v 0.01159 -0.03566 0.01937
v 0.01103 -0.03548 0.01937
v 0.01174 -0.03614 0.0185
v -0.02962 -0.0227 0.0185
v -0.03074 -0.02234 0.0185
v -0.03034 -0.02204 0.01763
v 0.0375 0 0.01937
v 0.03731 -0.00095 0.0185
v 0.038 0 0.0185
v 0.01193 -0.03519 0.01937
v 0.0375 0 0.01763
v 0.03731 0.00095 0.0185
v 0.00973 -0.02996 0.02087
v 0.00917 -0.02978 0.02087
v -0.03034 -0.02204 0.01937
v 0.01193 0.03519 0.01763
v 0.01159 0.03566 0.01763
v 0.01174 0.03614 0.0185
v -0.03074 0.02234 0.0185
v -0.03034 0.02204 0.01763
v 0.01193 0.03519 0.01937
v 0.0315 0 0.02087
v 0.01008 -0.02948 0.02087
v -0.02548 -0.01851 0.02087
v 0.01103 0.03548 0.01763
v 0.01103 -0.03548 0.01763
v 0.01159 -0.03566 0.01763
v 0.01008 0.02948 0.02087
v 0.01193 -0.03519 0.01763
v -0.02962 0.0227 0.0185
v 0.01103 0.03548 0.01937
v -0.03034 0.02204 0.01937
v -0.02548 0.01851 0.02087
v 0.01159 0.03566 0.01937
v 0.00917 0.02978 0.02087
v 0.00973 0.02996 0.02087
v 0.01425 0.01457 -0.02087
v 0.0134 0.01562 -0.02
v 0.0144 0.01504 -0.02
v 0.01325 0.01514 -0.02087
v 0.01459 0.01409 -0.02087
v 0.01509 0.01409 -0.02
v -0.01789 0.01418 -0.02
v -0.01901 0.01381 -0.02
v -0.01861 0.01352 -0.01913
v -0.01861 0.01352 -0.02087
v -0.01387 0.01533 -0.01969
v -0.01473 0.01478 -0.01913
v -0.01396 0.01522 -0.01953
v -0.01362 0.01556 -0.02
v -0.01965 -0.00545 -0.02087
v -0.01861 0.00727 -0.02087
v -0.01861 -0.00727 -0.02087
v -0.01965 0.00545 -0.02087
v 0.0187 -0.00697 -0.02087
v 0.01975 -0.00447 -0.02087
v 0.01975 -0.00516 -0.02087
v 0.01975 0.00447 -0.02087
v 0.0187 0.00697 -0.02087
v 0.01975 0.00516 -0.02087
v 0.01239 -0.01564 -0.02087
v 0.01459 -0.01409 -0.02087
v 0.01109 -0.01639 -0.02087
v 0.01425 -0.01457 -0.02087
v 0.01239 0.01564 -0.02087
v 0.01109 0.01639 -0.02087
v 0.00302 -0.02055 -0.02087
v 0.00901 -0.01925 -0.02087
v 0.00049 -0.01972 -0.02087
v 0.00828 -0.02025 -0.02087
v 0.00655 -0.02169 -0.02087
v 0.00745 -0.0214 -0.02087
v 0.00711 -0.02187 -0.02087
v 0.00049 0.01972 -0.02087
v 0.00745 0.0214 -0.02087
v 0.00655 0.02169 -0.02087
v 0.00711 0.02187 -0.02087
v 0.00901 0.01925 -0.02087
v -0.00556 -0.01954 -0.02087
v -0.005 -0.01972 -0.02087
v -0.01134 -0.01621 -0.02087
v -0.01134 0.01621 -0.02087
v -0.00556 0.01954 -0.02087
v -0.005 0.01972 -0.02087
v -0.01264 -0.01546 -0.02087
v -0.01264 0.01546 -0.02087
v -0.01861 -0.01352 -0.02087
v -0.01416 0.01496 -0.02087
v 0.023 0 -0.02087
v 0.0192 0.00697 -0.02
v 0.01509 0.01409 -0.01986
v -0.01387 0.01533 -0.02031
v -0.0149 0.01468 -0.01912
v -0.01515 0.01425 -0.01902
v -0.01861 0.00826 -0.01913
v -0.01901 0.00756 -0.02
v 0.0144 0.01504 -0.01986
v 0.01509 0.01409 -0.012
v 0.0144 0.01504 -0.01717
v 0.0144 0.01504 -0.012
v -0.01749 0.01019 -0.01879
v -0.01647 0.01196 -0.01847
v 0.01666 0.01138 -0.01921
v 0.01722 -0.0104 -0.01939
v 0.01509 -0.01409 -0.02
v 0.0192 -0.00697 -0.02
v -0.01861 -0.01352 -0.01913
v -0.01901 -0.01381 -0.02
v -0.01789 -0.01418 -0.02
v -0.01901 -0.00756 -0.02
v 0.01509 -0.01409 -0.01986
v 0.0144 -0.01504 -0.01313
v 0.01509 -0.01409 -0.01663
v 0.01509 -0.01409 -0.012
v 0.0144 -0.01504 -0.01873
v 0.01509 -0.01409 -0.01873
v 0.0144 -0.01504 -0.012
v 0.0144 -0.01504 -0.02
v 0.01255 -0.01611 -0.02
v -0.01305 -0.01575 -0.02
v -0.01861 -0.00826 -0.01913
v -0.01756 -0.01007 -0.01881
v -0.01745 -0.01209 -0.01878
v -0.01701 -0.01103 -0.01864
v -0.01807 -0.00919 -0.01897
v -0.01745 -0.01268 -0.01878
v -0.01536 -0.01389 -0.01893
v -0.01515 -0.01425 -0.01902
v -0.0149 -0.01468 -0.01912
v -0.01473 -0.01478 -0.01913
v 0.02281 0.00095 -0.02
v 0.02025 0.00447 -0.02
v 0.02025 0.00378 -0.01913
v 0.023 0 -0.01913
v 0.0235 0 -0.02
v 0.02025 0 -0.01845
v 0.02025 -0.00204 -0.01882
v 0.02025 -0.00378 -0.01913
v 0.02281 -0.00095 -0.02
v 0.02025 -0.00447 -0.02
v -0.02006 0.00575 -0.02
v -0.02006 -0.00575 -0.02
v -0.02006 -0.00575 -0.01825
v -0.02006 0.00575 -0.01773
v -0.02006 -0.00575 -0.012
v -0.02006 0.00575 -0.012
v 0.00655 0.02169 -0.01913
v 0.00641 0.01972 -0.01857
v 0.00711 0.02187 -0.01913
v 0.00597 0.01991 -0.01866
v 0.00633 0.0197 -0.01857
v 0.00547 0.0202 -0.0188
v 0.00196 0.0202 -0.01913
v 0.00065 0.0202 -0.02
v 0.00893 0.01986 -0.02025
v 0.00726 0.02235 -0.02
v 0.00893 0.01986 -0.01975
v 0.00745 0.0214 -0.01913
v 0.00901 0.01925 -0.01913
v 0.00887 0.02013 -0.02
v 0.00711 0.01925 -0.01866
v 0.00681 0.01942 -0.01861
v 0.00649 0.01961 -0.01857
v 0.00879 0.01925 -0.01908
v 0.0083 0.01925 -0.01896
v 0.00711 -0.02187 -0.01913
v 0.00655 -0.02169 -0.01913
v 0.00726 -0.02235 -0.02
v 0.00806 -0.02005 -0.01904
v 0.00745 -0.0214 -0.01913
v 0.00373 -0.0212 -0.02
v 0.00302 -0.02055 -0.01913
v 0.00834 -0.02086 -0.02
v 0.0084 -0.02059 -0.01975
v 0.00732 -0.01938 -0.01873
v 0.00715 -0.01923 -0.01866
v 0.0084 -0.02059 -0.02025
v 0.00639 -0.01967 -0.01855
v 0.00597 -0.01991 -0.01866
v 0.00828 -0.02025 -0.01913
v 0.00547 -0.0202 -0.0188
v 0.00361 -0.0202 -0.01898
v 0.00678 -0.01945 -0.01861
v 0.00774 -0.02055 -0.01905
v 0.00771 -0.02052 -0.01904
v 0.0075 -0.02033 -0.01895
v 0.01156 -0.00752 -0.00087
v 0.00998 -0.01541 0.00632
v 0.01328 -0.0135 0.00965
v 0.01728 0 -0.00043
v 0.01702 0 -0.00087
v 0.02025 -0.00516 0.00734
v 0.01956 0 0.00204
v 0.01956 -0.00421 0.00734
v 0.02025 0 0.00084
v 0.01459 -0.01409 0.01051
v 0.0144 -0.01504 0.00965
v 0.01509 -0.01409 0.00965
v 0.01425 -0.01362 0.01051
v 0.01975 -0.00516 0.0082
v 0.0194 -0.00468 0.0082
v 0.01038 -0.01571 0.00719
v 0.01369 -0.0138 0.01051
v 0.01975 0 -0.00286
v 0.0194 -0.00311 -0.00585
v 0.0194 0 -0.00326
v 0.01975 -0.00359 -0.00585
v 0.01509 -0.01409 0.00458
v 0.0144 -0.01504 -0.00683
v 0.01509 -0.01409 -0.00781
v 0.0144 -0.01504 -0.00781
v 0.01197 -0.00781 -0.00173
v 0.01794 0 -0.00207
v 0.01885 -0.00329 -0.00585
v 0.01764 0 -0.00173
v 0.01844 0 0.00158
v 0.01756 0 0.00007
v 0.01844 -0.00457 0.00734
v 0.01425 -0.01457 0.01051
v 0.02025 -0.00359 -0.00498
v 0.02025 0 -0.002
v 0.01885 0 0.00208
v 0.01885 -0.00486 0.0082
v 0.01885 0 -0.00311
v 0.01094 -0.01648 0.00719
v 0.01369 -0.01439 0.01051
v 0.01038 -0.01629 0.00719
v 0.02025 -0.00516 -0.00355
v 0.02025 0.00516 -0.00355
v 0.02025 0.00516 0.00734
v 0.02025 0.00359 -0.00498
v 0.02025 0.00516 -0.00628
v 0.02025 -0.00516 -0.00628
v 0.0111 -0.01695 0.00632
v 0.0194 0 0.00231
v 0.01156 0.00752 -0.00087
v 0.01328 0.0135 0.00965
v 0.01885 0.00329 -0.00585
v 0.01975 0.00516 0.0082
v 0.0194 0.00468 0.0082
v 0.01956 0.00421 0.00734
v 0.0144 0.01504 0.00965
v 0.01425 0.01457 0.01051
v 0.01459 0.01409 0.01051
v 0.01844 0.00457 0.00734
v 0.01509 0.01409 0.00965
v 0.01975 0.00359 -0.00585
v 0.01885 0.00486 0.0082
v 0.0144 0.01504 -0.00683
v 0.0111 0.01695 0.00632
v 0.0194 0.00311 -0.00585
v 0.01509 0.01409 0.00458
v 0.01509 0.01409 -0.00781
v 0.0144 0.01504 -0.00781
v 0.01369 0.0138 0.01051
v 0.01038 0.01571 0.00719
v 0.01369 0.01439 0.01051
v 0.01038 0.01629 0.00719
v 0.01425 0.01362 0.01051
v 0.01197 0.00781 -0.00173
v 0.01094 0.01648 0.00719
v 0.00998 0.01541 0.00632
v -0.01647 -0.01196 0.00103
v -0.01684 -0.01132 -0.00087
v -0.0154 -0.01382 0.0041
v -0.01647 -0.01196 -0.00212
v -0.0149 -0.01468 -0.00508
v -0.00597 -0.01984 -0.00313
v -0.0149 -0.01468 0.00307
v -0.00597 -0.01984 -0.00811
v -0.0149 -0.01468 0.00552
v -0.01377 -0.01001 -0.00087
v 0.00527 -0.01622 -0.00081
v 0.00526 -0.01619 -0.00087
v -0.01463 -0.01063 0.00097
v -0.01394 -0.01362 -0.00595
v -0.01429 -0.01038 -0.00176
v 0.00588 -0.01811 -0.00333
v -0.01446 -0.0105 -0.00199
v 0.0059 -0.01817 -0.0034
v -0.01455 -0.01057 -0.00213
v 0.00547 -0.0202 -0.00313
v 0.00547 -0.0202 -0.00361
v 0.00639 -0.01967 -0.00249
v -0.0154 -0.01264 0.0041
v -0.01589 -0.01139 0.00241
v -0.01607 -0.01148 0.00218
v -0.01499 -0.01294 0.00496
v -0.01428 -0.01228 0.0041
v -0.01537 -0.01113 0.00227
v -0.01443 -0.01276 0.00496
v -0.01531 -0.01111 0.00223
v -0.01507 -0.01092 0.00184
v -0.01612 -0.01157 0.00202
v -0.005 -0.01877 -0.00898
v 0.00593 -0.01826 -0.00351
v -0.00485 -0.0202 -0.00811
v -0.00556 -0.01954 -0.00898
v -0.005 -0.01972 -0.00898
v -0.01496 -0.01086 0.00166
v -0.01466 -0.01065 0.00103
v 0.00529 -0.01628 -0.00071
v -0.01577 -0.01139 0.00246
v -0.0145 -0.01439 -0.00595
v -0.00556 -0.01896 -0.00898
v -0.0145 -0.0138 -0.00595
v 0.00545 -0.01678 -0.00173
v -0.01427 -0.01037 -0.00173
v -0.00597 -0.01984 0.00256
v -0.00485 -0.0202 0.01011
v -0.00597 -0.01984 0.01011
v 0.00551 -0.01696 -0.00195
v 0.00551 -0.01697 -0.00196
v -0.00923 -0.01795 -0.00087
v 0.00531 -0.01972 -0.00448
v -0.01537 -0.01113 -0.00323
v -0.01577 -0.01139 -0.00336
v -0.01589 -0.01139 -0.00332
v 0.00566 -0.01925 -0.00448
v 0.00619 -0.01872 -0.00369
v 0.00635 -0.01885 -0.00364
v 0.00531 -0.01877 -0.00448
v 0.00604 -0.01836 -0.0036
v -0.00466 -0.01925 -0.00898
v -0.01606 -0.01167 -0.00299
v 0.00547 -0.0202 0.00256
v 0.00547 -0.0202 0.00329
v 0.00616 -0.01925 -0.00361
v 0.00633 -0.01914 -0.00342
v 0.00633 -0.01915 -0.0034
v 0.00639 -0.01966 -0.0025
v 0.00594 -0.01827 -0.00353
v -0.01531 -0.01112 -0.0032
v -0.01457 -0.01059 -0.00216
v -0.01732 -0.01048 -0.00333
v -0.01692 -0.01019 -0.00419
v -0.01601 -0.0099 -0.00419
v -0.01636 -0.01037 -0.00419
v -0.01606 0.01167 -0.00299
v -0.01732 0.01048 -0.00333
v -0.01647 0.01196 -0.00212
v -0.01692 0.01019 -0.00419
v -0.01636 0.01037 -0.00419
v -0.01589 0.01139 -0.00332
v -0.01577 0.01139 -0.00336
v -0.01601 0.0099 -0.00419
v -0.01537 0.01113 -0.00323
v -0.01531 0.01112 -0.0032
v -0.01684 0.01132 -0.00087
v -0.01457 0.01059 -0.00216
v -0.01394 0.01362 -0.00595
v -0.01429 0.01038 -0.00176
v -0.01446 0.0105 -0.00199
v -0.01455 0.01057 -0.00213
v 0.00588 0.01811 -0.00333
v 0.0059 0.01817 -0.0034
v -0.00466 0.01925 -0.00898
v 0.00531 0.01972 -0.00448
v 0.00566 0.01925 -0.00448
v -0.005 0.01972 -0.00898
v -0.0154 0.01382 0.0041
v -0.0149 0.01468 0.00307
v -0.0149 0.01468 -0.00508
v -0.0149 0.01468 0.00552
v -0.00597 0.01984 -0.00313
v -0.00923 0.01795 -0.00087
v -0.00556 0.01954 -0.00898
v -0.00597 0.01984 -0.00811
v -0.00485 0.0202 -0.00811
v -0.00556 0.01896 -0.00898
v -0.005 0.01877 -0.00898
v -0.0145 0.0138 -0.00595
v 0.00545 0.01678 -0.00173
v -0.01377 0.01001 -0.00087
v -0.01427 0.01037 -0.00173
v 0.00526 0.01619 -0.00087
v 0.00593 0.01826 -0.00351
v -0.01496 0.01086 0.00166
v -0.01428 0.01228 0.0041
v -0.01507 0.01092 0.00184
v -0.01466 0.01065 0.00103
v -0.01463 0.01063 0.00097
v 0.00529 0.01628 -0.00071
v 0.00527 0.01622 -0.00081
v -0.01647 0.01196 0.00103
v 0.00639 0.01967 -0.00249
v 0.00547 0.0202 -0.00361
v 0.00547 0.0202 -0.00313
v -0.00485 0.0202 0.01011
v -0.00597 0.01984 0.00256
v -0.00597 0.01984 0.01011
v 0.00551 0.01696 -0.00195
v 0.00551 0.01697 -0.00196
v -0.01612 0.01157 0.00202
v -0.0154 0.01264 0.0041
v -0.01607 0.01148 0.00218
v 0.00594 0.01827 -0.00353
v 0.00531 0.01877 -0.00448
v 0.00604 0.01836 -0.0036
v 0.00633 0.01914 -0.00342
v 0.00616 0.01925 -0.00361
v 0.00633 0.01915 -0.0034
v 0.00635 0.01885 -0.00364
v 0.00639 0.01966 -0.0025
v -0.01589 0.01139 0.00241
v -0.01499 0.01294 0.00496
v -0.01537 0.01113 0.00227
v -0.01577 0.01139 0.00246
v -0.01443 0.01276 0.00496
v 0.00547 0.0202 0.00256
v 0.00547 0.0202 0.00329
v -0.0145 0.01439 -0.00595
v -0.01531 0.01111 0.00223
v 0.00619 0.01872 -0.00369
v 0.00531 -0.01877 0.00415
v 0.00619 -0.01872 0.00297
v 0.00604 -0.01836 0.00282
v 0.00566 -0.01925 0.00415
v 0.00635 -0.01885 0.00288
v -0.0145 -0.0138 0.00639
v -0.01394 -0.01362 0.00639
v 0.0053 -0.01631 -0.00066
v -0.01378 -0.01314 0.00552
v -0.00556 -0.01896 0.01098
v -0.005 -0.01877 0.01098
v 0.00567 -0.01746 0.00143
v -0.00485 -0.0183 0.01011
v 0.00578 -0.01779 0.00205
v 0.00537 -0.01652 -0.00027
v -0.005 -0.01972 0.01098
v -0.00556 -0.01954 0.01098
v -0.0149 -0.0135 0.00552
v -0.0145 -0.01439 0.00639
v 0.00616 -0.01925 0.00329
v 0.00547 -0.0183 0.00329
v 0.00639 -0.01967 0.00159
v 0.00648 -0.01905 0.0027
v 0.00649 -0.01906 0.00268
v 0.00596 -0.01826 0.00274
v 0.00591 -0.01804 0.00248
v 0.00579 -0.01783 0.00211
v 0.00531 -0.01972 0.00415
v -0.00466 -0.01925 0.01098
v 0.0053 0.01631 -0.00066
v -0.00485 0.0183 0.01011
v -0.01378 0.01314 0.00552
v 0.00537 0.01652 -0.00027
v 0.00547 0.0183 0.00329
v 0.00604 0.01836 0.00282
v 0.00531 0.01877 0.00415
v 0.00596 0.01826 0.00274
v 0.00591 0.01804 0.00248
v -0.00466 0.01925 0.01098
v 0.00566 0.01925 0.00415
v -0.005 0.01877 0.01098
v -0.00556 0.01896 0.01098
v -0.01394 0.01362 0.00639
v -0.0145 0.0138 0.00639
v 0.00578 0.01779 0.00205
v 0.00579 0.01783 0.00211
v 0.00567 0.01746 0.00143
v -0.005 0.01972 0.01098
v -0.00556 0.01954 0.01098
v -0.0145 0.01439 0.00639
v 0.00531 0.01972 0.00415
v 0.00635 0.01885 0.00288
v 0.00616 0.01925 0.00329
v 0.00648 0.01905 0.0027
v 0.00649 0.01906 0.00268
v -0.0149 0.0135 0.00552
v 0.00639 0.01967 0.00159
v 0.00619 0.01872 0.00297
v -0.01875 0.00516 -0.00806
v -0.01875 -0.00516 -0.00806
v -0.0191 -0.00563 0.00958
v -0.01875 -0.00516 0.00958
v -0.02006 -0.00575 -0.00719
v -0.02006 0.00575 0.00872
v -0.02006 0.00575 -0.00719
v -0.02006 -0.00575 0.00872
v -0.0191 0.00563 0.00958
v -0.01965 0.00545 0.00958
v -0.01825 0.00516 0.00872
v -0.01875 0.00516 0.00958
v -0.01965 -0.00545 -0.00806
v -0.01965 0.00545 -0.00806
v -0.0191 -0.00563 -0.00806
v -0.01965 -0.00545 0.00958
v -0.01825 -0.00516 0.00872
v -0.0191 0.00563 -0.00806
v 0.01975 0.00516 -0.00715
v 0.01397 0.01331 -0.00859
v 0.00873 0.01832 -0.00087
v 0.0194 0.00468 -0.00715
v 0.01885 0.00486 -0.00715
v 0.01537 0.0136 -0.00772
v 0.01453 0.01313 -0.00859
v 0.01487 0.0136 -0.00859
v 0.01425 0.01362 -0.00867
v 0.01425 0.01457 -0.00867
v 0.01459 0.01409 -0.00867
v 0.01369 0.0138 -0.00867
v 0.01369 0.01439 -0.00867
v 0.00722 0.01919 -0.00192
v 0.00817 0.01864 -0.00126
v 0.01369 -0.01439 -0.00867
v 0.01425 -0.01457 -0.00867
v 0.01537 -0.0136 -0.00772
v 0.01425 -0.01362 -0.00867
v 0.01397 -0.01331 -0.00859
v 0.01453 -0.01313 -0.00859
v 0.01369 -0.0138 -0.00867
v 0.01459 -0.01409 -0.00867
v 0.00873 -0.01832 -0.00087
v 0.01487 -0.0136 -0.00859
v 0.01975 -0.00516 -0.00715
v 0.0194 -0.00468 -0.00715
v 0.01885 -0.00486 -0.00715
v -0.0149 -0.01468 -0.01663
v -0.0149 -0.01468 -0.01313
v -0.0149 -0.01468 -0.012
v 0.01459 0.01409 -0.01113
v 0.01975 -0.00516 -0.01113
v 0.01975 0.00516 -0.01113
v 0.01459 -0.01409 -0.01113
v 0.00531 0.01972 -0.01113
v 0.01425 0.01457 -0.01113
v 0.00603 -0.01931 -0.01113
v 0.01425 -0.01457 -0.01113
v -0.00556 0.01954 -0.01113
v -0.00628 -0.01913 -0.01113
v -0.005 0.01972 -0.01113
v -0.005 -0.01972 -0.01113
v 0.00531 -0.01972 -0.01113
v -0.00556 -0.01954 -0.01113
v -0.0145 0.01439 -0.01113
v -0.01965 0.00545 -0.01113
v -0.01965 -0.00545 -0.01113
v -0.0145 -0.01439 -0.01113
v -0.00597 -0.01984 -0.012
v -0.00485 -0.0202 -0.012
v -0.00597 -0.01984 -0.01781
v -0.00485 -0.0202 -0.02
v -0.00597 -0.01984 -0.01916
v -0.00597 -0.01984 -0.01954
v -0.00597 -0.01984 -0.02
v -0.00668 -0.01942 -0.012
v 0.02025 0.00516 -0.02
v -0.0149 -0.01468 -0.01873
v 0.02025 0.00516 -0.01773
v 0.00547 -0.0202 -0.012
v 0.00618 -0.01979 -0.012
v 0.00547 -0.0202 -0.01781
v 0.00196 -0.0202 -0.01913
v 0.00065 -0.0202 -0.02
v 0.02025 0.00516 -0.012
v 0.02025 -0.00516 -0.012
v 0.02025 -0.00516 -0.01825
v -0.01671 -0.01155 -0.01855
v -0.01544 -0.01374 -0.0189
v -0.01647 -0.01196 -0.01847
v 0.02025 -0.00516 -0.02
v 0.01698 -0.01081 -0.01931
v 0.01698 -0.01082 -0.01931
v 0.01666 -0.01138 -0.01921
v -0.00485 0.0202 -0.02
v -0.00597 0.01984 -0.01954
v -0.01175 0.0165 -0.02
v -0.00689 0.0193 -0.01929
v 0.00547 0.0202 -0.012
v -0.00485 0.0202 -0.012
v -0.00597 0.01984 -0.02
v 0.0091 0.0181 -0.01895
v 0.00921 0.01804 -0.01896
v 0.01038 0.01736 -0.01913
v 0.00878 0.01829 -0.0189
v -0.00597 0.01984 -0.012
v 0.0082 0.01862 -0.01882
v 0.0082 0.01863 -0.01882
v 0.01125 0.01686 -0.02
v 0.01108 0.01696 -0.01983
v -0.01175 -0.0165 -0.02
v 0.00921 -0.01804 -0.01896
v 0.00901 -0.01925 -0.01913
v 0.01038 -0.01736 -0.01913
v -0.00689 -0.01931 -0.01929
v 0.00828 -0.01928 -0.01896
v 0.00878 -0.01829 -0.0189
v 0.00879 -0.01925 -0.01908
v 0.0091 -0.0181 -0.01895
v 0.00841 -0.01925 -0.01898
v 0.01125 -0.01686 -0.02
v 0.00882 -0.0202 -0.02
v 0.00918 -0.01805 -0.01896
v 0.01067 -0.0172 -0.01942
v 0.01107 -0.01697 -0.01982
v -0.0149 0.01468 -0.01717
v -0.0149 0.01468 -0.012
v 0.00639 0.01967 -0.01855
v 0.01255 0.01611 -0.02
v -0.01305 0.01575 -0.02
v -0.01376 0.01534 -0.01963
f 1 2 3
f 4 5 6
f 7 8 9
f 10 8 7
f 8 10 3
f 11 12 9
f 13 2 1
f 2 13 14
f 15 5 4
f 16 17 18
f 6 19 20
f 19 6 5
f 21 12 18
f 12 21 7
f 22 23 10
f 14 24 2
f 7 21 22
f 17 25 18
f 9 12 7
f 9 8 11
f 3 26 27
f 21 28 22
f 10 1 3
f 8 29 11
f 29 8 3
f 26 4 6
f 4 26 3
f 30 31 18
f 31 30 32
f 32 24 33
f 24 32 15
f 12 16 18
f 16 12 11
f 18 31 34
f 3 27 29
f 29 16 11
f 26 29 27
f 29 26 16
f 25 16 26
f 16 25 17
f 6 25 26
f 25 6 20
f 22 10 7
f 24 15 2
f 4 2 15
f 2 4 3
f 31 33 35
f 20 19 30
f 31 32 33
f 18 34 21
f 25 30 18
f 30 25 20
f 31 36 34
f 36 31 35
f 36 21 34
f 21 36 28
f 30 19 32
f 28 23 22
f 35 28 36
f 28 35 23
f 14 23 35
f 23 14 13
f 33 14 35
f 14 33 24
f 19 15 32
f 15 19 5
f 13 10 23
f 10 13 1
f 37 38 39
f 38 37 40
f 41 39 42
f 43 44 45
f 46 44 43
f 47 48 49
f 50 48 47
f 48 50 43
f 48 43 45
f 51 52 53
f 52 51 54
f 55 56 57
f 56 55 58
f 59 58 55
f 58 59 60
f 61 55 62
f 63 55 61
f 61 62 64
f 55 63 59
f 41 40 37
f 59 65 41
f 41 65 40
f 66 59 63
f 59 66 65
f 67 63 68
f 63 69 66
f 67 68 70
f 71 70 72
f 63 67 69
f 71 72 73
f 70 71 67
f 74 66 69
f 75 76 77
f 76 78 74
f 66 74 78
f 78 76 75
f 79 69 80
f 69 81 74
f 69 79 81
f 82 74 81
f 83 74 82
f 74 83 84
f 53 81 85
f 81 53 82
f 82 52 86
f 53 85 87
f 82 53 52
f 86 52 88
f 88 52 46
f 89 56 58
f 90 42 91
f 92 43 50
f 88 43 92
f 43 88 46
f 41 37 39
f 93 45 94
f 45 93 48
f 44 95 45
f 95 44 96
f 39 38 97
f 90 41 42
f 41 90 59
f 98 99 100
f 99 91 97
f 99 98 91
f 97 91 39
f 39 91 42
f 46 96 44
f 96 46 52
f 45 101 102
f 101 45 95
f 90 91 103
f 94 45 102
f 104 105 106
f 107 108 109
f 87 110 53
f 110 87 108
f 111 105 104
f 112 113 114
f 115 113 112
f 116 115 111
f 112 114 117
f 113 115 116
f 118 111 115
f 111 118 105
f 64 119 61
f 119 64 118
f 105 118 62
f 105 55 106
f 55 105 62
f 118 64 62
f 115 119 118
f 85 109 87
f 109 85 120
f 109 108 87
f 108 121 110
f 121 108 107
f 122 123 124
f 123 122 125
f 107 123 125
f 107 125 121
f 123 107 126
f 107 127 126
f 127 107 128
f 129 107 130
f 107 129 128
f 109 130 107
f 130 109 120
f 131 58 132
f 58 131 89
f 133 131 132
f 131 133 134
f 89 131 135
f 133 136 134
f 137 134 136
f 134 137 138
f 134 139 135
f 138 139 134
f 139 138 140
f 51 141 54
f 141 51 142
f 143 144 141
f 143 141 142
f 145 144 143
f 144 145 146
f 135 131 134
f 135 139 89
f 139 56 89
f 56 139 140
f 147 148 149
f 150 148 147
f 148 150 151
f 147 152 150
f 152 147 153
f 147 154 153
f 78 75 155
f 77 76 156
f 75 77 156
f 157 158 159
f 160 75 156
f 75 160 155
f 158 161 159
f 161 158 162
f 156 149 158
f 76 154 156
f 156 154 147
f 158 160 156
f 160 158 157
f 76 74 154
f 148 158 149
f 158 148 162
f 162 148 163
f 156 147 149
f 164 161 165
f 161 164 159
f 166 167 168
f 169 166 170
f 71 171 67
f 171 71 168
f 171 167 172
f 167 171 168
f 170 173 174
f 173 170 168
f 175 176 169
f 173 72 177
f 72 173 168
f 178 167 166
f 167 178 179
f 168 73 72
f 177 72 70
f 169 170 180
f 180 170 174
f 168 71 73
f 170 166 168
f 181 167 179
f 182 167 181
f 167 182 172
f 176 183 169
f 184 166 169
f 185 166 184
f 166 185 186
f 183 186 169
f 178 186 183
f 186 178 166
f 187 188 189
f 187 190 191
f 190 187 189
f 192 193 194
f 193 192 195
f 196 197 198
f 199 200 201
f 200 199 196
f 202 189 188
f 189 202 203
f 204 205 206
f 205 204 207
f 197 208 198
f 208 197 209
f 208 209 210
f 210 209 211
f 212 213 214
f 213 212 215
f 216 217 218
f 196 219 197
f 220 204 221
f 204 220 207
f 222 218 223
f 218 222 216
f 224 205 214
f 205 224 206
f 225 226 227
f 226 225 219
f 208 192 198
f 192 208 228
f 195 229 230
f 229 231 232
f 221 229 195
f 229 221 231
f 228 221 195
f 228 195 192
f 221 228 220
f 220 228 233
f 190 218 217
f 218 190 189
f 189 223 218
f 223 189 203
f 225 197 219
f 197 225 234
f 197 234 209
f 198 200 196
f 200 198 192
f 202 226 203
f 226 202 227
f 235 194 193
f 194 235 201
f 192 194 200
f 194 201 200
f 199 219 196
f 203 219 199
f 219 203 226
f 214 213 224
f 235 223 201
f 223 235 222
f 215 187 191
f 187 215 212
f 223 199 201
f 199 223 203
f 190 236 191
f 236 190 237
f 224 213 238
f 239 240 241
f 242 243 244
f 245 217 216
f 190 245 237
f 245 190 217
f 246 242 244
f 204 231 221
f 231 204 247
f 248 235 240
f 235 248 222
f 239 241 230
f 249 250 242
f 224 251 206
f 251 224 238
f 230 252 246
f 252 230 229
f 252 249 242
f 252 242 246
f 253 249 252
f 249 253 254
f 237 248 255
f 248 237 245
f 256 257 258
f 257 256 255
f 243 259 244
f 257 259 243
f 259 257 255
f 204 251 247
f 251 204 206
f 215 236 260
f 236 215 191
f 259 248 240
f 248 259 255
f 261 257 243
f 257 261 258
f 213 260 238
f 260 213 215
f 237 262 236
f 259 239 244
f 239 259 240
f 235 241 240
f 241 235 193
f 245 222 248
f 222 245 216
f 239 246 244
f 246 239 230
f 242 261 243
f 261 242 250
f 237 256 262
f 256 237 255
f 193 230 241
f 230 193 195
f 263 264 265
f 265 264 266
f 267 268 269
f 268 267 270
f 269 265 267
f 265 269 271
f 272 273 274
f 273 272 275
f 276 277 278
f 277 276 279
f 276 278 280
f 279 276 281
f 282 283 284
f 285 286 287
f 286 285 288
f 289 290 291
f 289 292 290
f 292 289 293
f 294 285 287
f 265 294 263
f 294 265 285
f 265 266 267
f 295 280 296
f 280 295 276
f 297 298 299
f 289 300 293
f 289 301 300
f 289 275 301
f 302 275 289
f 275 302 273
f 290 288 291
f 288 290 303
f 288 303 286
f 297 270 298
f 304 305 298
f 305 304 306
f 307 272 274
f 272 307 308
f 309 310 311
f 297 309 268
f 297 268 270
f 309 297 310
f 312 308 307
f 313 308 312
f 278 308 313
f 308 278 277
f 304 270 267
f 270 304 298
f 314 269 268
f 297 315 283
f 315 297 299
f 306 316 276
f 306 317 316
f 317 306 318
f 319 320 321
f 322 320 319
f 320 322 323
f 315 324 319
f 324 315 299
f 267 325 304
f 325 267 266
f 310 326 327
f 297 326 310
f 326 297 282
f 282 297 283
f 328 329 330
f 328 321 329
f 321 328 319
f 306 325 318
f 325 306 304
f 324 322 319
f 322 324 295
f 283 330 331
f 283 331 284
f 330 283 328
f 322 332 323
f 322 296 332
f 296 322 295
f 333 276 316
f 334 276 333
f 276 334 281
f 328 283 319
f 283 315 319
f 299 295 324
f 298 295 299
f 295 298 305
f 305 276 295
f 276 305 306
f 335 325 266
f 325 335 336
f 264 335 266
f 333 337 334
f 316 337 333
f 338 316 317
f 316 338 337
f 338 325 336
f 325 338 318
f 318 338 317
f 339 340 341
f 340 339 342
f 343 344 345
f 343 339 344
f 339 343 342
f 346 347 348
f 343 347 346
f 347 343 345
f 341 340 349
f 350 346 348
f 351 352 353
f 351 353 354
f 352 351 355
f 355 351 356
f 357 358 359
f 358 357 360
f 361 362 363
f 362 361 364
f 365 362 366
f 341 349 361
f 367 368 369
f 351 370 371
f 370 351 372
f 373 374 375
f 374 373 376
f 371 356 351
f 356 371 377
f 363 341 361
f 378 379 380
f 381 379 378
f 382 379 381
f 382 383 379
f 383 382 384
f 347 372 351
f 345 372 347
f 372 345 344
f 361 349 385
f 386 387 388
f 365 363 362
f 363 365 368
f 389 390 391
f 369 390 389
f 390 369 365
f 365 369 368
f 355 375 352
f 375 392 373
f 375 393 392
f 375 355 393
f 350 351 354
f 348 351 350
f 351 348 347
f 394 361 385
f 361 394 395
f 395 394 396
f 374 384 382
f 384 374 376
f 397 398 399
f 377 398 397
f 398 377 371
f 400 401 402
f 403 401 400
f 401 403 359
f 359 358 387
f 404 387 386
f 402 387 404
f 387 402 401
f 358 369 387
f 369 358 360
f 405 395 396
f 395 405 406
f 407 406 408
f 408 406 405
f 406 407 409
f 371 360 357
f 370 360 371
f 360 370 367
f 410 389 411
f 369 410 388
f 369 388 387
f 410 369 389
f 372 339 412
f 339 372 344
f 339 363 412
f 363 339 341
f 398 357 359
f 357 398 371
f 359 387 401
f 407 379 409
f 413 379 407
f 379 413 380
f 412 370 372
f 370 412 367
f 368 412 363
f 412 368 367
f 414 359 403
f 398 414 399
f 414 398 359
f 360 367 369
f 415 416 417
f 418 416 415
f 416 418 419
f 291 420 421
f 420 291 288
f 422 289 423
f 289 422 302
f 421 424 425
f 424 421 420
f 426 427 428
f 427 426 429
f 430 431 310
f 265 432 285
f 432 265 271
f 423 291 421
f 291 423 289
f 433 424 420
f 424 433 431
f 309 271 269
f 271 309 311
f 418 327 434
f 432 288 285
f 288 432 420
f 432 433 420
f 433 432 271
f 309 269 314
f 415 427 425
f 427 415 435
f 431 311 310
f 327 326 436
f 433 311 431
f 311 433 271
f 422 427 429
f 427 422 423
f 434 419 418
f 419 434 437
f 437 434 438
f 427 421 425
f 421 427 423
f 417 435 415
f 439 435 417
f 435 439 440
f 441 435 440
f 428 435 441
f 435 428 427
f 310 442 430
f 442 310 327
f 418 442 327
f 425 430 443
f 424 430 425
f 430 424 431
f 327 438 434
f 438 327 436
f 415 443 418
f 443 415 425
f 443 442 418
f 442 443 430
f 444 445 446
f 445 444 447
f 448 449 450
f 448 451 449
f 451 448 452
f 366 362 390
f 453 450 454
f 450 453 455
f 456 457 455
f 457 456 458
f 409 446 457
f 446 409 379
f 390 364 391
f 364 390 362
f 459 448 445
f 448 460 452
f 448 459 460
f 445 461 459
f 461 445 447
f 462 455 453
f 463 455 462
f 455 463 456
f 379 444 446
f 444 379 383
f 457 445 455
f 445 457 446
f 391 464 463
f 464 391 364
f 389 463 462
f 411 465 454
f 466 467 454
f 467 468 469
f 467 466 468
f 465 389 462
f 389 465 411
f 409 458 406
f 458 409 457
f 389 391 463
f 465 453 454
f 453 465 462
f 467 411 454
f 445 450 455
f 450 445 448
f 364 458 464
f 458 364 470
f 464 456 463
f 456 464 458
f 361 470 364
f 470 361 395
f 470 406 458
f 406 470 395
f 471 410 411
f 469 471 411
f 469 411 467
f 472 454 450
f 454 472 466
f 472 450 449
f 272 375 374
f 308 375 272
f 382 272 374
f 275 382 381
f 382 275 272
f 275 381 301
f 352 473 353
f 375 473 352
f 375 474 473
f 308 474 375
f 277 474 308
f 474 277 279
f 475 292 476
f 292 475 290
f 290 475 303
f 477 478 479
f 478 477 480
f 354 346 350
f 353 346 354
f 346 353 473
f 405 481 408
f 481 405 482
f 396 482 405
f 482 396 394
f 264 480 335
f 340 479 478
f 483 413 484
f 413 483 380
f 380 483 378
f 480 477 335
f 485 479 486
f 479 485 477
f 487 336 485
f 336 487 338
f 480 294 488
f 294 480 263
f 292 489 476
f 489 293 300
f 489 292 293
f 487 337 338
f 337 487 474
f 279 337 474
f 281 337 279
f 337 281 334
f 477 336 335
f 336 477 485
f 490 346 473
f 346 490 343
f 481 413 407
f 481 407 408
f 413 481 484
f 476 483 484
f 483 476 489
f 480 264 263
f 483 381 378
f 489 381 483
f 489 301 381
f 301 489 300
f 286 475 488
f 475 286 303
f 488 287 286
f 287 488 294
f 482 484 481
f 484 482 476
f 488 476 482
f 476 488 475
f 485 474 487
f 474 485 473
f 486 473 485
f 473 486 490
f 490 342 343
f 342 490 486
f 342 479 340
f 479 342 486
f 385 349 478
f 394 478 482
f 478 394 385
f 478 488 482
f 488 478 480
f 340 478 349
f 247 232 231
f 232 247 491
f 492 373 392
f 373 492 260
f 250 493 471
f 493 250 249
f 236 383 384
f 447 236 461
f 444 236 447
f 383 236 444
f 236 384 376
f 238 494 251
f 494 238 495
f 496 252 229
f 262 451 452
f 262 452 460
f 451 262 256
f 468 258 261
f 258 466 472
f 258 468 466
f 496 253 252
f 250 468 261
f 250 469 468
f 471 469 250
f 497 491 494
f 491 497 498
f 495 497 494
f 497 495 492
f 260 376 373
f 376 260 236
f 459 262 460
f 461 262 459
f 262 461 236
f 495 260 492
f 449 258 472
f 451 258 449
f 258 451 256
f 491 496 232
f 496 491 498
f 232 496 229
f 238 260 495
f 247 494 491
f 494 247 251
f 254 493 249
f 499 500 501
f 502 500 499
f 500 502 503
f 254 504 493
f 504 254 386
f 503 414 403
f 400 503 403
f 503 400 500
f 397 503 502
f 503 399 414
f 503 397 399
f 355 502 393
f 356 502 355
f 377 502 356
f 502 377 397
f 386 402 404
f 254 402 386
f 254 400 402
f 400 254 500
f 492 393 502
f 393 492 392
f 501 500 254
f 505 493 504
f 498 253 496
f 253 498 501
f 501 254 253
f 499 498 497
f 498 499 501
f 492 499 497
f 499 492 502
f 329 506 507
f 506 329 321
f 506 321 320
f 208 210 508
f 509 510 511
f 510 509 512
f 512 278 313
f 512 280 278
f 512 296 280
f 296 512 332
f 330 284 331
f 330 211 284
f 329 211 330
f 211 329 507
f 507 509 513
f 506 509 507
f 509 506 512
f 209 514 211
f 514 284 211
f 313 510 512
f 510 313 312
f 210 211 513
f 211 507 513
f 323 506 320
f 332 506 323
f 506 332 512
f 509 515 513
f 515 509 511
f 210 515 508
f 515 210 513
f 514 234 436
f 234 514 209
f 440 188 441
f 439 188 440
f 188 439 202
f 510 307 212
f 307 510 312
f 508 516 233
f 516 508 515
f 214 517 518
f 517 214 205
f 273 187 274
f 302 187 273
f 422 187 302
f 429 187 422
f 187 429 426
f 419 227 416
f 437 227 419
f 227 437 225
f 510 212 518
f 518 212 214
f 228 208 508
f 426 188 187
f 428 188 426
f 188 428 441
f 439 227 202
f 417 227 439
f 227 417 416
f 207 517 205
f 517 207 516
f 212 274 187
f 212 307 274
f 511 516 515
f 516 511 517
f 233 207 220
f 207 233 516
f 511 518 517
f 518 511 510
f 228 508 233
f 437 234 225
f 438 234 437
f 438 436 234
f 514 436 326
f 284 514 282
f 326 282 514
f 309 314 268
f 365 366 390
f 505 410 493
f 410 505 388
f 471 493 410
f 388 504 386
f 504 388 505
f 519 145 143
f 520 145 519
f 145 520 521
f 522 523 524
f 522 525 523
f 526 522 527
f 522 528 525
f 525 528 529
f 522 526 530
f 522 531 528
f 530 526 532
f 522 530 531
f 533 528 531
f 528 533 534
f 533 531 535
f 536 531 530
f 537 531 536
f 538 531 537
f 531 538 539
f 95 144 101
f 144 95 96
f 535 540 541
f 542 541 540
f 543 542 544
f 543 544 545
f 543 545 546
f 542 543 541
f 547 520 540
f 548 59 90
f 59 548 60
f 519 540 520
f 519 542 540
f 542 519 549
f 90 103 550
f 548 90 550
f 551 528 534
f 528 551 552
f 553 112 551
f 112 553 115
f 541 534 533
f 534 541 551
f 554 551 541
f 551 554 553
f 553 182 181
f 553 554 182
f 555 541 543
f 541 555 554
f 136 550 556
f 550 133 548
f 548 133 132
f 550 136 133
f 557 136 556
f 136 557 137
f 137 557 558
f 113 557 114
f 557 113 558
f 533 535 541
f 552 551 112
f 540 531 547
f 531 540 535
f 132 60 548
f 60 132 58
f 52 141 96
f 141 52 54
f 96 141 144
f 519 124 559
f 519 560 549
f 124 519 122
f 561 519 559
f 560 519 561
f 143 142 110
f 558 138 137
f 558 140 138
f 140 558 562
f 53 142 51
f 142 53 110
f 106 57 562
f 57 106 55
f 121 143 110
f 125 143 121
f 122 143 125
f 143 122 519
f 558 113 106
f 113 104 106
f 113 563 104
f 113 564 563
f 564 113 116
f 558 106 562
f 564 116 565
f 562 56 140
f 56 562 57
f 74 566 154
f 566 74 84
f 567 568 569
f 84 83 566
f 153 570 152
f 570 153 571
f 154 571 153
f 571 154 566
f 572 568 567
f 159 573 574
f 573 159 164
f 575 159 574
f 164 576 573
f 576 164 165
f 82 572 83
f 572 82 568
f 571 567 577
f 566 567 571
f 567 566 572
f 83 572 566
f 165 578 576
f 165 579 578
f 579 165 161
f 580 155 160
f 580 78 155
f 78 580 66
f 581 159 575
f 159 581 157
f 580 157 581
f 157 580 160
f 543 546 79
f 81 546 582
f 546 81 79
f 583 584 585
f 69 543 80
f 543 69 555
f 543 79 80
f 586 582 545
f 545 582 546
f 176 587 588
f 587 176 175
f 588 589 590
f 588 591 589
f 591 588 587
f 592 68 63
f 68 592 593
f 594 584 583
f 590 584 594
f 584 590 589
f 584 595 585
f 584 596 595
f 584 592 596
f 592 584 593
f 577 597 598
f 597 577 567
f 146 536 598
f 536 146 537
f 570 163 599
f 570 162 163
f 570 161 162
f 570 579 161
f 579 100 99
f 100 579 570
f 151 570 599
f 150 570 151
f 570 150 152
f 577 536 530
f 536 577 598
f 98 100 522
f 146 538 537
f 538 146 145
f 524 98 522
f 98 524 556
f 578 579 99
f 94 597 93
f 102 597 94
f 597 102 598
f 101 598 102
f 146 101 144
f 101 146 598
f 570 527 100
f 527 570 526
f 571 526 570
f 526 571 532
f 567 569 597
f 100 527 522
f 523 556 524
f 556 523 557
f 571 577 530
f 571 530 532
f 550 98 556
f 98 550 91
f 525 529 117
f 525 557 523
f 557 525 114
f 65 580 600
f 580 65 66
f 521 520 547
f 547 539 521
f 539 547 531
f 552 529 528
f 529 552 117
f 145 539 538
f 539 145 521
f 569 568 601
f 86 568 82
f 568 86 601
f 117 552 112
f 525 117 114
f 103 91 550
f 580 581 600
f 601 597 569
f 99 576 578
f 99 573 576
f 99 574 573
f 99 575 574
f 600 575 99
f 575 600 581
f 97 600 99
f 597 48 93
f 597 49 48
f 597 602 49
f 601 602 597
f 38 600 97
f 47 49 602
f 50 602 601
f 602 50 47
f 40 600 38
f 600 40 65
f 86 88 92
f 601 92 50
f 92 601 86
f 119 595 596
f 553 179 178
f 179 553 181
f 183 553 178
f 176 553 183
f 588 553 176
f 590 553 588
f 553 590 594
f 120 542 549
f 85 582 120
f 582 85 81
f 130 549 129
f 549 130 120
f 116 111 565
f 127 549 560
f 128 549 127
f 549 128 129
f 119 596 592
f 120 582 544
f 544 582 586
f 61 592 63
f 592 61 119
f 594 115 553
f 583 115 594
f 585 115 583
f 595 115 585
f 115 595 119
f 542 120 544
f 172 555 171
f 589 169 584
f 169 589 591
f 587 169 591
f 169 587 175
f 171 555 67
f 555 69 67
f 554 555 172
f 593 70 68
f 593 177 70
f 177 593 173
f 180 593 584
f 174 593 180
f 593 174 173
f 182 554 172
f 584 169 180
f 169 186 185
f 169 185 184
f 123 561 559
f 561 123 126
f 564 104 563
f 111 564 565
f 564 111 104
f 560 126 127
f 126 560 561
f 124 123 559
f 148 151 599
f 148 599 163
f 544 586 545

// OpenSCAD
// Parameters
bbox_x = 0.07; //[0.035:0.14:0.001]
bbox_y = 0.07; //[0.035:0.14:0.001]
bbox_z = 0.04; //[0.02:0.08:0.001]
outer_d_top = 0.07; //[0.035:0.14:0.001]
outer_d_bottom = 0.045; //[0.0225:0.09:0.001]
outer_h = 0.04; //[0.02:0.08:0.001]
wall_t = 0.006; //[0.003:0.012:0.0005]
rim_h = 0.006; //[0.003:0.012:0.0005]
rim_overhang = 0.002; //[0.001:0.004:0.0005]
cavity_depth = 0.032; //[0.016:0.064:0.001]
cavity_d_top = 0.056; //[0.028:0.112:0.001]
cavity_round_r = 0.028; //[0.014:0.056:0.001]
facet_count = 12; //[6:36:1]
notch_w = 0.012; //[0.006:0.024:0.001]
notch_h = 0.008; //[0.004:0.016:0.001]
notch_depth = 0.006; //[0.003:0.012:0.001]
notch_z_from_top = 0.004; //[0.002:0.008:0.001]
eps_overlap = 0.001; //[0.0005:0.002:0.0005]
chamfer_z = 0.0015; //[0.0005:0.003:0.0005]
micro_fillet_r = 0.001; //[0.0005:0.002:0.0005]

// Base Shapes
module outer_body_tapered_shell() {
  translate([0, 0, 0])
    cylinder(h=outer_h, r1=outer_d_top/2, r2=outer_d_bottom/2, center=true);
}

module rim_lip_outer() {
  translate([0, 0, outer_h/2 - rim_h/2])
    cylinder(h=rim_h, r=outer_d_top/2 + rim_overhang, center=true);
}

module rim_lip_inner_cut() {
  translate([0, 0, outer_h/2 - rim_h/2])
    cylinder(h=rim_h + eps_overlap*2, r=outer_d_top/2 - wall_t, center=true);
}

module inner_cavity_bowl_sphere() {
  translate([0, 0, outer_h/2 - cavity_depth + cavity_round_r])
    sphere(r=cavity_round_r);
}

module inner_cavity_bowl_cone() {
  translate([0, 0, outer_h/2 - cavity_depth/2])
    cylinder(h=cavity_depth, r1=cavity_d_top/2, r2=0, center=true);
}

module notch_cutout_posx() {
  translate([outer_d_top/2 + rim_overhang - (notch_depth/2) + eps_overlap, 0, outer_h/2 - notch_z_from_top])
    cube([notch_depth + eps_overlap*2, notch_w, notch_h], center=true);
}

module notch_cutout_negx() {
  translate([-(outer_d_top/2 + rim_overhang - (notch_depth/2) + eps_overlap), 0, outer_h/2 - notch_z_from_top])
    cube([notch_depth + eps_overlap*2, notch_w, notch_h], center=true);
}

module facet_box(angle) {
  rotate([0, 0, angle])
    cube([outer_d_top + rim_overhang*2, outer_d_top*0.55, outer_h + eps_overlap*2], center=true);
}

module chamfer_top_cone() {
  translate([0, 0, outer_h/2 - chamfer_z/2])
    cylinder(h=chamfer_z, r1=outer_d_top/2 + rim_overhang, r2=outer_d_top/2 + rim_overhang - wall_t, center=true);
}

module chamfer_bottom_cone() {
  translate([0, 0, -outer_h/2 + chamfer_z/2])
    cylinder(h=chamfer_z, r1=outer_d_bottom/2, r2=outer_d_bottom/2 - wall_t, center=true);
}

module micro_fillet_sphere() {
  sphere(r=micro_fillet_r);
}

// Operations
module rim_lip() {
  difference() {
    rim_lip_outer();
    rim_lip_inner_cut();
  }
}

module outer_body_with_rim() {
  union() {
    outer_body_tapered_shell();
    rim_lip();
  }
}

module inner_cavity_bowl() {
  union() {
    inner_cavity_bowl_cone();
    inner_cavity_bowl_sphere();
  }
}

module opposing_rim_notches() {
  union() {
    notch_cutout_posx();
    notch_cutout_negx();
  }
}

module body_minus_cavity() {
  difference() {
    outer_body_with_rim();
    inner_cavity_bowl();
  }
}

module body_minus_cavity_and_notches() {
  difference() {
    body_minus_cavity();
    opposing_rim_notches();
  }
}

module decorative_facet_pattern_variation() {
  intersection() {
    facet_box(0);
    facet_box(360/12);
    facet_box(2*360/12);
    facet_box(3*360/12);
    facet_box(4*360/12);
    facet_box(5*360/12);
  }
}

module faceted_outer_surface() {
  intersection() {
    body_minus_cavity_and_notches();
    decorative_facet_pattern_variation();
  }
}

module small_edge_chamfers() {
  union() {
    chamfer_top_cone();
    chamfer_bottom_cone();
  }
}

module body_with_chamfers() {
  union() {
    faceted_outer_surface();
    small_edge_chamfers();
  }
}

// Final Output
minkowski() {
  body_with_chamfers();
  micro_fillet_sphere();
}
